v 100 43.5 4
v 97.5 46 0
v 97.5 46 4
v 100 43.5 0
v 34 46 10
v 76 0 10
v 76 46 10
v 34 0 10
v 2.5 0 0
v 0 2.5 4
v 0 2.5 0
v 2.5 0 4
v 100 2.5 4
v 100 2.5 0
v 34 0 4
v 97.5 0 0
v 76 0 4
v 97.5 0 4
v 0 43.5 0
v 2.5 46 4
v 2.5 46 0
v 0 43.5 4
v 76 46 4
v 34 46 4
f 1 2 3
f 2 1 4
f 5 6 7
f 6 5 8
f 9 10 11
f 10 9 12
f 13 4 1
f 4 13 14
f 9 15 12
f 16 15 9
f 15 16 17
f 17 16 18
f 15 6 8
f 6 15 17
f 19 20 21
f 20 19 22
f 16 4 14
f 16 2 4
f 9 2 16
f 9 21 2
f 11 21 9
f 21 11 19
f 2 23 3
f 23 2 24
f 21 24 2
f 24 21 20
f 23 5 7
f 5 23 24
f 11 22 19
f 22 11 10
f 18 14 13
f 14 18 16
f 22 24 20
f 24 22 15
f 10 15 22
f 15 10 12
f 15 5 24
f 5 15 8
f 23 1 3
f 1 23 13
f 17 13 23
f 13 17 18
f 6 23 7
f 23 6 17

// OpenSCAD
$fn = 32;

// ----------------------------------------------------------------------
// Stepped bar: centerstep, 100 x 46 x 10/4 mm
// ----------------------------------------------------------------------

// --- parameters (mm) ---
bar_l = 100;              // bar length, X
bar_w = 46;               // bar width, Y
plate_t = 10;             // thickness of the thick zone, Z
thin_t = 4;               // thickness of the thin zone
corner_c = 2.5;           // corner chamfer of the bar
step_cut = 6;             // material removed from the thin zone
thick_from = 34;          // start of the thick middle zone
thick_to = 76;            // end of the thick middle zone
depth_1 = 6;              // depth of cut 1 from the top face
depth_2 = 6;              // depth of cut 2 from the top face

profile = [[2.5, 0], [97.5, 0], [100, 2.5], [100, 43.5], [97.5, 46], [2.5, 46], [0, 43.5], [0, 2.5]];  // primary outline, 8 points, counter clockwise
void_1 = [[-1, -1], [34, -1], [34, 47], [-1, 47]];  // thin left end, 4 points
void_2 = [[76, -1], [101, -1], [101, 47], [76, 47]];  // thin right end, 4 points

// --- the one profile operation ---
difference() {
  linear_extrude(height = plate_t) polygon(points = profile);
  translate([0, 0, plate_t - depth_1])
    linear_extrude(height = depth_1 + 1) polygon(points = void_1);
  translate([0, 0, plate_t - depth_2])
    linear_extrude(height = depth_2 + 1) polygon(points = void_2);
}
